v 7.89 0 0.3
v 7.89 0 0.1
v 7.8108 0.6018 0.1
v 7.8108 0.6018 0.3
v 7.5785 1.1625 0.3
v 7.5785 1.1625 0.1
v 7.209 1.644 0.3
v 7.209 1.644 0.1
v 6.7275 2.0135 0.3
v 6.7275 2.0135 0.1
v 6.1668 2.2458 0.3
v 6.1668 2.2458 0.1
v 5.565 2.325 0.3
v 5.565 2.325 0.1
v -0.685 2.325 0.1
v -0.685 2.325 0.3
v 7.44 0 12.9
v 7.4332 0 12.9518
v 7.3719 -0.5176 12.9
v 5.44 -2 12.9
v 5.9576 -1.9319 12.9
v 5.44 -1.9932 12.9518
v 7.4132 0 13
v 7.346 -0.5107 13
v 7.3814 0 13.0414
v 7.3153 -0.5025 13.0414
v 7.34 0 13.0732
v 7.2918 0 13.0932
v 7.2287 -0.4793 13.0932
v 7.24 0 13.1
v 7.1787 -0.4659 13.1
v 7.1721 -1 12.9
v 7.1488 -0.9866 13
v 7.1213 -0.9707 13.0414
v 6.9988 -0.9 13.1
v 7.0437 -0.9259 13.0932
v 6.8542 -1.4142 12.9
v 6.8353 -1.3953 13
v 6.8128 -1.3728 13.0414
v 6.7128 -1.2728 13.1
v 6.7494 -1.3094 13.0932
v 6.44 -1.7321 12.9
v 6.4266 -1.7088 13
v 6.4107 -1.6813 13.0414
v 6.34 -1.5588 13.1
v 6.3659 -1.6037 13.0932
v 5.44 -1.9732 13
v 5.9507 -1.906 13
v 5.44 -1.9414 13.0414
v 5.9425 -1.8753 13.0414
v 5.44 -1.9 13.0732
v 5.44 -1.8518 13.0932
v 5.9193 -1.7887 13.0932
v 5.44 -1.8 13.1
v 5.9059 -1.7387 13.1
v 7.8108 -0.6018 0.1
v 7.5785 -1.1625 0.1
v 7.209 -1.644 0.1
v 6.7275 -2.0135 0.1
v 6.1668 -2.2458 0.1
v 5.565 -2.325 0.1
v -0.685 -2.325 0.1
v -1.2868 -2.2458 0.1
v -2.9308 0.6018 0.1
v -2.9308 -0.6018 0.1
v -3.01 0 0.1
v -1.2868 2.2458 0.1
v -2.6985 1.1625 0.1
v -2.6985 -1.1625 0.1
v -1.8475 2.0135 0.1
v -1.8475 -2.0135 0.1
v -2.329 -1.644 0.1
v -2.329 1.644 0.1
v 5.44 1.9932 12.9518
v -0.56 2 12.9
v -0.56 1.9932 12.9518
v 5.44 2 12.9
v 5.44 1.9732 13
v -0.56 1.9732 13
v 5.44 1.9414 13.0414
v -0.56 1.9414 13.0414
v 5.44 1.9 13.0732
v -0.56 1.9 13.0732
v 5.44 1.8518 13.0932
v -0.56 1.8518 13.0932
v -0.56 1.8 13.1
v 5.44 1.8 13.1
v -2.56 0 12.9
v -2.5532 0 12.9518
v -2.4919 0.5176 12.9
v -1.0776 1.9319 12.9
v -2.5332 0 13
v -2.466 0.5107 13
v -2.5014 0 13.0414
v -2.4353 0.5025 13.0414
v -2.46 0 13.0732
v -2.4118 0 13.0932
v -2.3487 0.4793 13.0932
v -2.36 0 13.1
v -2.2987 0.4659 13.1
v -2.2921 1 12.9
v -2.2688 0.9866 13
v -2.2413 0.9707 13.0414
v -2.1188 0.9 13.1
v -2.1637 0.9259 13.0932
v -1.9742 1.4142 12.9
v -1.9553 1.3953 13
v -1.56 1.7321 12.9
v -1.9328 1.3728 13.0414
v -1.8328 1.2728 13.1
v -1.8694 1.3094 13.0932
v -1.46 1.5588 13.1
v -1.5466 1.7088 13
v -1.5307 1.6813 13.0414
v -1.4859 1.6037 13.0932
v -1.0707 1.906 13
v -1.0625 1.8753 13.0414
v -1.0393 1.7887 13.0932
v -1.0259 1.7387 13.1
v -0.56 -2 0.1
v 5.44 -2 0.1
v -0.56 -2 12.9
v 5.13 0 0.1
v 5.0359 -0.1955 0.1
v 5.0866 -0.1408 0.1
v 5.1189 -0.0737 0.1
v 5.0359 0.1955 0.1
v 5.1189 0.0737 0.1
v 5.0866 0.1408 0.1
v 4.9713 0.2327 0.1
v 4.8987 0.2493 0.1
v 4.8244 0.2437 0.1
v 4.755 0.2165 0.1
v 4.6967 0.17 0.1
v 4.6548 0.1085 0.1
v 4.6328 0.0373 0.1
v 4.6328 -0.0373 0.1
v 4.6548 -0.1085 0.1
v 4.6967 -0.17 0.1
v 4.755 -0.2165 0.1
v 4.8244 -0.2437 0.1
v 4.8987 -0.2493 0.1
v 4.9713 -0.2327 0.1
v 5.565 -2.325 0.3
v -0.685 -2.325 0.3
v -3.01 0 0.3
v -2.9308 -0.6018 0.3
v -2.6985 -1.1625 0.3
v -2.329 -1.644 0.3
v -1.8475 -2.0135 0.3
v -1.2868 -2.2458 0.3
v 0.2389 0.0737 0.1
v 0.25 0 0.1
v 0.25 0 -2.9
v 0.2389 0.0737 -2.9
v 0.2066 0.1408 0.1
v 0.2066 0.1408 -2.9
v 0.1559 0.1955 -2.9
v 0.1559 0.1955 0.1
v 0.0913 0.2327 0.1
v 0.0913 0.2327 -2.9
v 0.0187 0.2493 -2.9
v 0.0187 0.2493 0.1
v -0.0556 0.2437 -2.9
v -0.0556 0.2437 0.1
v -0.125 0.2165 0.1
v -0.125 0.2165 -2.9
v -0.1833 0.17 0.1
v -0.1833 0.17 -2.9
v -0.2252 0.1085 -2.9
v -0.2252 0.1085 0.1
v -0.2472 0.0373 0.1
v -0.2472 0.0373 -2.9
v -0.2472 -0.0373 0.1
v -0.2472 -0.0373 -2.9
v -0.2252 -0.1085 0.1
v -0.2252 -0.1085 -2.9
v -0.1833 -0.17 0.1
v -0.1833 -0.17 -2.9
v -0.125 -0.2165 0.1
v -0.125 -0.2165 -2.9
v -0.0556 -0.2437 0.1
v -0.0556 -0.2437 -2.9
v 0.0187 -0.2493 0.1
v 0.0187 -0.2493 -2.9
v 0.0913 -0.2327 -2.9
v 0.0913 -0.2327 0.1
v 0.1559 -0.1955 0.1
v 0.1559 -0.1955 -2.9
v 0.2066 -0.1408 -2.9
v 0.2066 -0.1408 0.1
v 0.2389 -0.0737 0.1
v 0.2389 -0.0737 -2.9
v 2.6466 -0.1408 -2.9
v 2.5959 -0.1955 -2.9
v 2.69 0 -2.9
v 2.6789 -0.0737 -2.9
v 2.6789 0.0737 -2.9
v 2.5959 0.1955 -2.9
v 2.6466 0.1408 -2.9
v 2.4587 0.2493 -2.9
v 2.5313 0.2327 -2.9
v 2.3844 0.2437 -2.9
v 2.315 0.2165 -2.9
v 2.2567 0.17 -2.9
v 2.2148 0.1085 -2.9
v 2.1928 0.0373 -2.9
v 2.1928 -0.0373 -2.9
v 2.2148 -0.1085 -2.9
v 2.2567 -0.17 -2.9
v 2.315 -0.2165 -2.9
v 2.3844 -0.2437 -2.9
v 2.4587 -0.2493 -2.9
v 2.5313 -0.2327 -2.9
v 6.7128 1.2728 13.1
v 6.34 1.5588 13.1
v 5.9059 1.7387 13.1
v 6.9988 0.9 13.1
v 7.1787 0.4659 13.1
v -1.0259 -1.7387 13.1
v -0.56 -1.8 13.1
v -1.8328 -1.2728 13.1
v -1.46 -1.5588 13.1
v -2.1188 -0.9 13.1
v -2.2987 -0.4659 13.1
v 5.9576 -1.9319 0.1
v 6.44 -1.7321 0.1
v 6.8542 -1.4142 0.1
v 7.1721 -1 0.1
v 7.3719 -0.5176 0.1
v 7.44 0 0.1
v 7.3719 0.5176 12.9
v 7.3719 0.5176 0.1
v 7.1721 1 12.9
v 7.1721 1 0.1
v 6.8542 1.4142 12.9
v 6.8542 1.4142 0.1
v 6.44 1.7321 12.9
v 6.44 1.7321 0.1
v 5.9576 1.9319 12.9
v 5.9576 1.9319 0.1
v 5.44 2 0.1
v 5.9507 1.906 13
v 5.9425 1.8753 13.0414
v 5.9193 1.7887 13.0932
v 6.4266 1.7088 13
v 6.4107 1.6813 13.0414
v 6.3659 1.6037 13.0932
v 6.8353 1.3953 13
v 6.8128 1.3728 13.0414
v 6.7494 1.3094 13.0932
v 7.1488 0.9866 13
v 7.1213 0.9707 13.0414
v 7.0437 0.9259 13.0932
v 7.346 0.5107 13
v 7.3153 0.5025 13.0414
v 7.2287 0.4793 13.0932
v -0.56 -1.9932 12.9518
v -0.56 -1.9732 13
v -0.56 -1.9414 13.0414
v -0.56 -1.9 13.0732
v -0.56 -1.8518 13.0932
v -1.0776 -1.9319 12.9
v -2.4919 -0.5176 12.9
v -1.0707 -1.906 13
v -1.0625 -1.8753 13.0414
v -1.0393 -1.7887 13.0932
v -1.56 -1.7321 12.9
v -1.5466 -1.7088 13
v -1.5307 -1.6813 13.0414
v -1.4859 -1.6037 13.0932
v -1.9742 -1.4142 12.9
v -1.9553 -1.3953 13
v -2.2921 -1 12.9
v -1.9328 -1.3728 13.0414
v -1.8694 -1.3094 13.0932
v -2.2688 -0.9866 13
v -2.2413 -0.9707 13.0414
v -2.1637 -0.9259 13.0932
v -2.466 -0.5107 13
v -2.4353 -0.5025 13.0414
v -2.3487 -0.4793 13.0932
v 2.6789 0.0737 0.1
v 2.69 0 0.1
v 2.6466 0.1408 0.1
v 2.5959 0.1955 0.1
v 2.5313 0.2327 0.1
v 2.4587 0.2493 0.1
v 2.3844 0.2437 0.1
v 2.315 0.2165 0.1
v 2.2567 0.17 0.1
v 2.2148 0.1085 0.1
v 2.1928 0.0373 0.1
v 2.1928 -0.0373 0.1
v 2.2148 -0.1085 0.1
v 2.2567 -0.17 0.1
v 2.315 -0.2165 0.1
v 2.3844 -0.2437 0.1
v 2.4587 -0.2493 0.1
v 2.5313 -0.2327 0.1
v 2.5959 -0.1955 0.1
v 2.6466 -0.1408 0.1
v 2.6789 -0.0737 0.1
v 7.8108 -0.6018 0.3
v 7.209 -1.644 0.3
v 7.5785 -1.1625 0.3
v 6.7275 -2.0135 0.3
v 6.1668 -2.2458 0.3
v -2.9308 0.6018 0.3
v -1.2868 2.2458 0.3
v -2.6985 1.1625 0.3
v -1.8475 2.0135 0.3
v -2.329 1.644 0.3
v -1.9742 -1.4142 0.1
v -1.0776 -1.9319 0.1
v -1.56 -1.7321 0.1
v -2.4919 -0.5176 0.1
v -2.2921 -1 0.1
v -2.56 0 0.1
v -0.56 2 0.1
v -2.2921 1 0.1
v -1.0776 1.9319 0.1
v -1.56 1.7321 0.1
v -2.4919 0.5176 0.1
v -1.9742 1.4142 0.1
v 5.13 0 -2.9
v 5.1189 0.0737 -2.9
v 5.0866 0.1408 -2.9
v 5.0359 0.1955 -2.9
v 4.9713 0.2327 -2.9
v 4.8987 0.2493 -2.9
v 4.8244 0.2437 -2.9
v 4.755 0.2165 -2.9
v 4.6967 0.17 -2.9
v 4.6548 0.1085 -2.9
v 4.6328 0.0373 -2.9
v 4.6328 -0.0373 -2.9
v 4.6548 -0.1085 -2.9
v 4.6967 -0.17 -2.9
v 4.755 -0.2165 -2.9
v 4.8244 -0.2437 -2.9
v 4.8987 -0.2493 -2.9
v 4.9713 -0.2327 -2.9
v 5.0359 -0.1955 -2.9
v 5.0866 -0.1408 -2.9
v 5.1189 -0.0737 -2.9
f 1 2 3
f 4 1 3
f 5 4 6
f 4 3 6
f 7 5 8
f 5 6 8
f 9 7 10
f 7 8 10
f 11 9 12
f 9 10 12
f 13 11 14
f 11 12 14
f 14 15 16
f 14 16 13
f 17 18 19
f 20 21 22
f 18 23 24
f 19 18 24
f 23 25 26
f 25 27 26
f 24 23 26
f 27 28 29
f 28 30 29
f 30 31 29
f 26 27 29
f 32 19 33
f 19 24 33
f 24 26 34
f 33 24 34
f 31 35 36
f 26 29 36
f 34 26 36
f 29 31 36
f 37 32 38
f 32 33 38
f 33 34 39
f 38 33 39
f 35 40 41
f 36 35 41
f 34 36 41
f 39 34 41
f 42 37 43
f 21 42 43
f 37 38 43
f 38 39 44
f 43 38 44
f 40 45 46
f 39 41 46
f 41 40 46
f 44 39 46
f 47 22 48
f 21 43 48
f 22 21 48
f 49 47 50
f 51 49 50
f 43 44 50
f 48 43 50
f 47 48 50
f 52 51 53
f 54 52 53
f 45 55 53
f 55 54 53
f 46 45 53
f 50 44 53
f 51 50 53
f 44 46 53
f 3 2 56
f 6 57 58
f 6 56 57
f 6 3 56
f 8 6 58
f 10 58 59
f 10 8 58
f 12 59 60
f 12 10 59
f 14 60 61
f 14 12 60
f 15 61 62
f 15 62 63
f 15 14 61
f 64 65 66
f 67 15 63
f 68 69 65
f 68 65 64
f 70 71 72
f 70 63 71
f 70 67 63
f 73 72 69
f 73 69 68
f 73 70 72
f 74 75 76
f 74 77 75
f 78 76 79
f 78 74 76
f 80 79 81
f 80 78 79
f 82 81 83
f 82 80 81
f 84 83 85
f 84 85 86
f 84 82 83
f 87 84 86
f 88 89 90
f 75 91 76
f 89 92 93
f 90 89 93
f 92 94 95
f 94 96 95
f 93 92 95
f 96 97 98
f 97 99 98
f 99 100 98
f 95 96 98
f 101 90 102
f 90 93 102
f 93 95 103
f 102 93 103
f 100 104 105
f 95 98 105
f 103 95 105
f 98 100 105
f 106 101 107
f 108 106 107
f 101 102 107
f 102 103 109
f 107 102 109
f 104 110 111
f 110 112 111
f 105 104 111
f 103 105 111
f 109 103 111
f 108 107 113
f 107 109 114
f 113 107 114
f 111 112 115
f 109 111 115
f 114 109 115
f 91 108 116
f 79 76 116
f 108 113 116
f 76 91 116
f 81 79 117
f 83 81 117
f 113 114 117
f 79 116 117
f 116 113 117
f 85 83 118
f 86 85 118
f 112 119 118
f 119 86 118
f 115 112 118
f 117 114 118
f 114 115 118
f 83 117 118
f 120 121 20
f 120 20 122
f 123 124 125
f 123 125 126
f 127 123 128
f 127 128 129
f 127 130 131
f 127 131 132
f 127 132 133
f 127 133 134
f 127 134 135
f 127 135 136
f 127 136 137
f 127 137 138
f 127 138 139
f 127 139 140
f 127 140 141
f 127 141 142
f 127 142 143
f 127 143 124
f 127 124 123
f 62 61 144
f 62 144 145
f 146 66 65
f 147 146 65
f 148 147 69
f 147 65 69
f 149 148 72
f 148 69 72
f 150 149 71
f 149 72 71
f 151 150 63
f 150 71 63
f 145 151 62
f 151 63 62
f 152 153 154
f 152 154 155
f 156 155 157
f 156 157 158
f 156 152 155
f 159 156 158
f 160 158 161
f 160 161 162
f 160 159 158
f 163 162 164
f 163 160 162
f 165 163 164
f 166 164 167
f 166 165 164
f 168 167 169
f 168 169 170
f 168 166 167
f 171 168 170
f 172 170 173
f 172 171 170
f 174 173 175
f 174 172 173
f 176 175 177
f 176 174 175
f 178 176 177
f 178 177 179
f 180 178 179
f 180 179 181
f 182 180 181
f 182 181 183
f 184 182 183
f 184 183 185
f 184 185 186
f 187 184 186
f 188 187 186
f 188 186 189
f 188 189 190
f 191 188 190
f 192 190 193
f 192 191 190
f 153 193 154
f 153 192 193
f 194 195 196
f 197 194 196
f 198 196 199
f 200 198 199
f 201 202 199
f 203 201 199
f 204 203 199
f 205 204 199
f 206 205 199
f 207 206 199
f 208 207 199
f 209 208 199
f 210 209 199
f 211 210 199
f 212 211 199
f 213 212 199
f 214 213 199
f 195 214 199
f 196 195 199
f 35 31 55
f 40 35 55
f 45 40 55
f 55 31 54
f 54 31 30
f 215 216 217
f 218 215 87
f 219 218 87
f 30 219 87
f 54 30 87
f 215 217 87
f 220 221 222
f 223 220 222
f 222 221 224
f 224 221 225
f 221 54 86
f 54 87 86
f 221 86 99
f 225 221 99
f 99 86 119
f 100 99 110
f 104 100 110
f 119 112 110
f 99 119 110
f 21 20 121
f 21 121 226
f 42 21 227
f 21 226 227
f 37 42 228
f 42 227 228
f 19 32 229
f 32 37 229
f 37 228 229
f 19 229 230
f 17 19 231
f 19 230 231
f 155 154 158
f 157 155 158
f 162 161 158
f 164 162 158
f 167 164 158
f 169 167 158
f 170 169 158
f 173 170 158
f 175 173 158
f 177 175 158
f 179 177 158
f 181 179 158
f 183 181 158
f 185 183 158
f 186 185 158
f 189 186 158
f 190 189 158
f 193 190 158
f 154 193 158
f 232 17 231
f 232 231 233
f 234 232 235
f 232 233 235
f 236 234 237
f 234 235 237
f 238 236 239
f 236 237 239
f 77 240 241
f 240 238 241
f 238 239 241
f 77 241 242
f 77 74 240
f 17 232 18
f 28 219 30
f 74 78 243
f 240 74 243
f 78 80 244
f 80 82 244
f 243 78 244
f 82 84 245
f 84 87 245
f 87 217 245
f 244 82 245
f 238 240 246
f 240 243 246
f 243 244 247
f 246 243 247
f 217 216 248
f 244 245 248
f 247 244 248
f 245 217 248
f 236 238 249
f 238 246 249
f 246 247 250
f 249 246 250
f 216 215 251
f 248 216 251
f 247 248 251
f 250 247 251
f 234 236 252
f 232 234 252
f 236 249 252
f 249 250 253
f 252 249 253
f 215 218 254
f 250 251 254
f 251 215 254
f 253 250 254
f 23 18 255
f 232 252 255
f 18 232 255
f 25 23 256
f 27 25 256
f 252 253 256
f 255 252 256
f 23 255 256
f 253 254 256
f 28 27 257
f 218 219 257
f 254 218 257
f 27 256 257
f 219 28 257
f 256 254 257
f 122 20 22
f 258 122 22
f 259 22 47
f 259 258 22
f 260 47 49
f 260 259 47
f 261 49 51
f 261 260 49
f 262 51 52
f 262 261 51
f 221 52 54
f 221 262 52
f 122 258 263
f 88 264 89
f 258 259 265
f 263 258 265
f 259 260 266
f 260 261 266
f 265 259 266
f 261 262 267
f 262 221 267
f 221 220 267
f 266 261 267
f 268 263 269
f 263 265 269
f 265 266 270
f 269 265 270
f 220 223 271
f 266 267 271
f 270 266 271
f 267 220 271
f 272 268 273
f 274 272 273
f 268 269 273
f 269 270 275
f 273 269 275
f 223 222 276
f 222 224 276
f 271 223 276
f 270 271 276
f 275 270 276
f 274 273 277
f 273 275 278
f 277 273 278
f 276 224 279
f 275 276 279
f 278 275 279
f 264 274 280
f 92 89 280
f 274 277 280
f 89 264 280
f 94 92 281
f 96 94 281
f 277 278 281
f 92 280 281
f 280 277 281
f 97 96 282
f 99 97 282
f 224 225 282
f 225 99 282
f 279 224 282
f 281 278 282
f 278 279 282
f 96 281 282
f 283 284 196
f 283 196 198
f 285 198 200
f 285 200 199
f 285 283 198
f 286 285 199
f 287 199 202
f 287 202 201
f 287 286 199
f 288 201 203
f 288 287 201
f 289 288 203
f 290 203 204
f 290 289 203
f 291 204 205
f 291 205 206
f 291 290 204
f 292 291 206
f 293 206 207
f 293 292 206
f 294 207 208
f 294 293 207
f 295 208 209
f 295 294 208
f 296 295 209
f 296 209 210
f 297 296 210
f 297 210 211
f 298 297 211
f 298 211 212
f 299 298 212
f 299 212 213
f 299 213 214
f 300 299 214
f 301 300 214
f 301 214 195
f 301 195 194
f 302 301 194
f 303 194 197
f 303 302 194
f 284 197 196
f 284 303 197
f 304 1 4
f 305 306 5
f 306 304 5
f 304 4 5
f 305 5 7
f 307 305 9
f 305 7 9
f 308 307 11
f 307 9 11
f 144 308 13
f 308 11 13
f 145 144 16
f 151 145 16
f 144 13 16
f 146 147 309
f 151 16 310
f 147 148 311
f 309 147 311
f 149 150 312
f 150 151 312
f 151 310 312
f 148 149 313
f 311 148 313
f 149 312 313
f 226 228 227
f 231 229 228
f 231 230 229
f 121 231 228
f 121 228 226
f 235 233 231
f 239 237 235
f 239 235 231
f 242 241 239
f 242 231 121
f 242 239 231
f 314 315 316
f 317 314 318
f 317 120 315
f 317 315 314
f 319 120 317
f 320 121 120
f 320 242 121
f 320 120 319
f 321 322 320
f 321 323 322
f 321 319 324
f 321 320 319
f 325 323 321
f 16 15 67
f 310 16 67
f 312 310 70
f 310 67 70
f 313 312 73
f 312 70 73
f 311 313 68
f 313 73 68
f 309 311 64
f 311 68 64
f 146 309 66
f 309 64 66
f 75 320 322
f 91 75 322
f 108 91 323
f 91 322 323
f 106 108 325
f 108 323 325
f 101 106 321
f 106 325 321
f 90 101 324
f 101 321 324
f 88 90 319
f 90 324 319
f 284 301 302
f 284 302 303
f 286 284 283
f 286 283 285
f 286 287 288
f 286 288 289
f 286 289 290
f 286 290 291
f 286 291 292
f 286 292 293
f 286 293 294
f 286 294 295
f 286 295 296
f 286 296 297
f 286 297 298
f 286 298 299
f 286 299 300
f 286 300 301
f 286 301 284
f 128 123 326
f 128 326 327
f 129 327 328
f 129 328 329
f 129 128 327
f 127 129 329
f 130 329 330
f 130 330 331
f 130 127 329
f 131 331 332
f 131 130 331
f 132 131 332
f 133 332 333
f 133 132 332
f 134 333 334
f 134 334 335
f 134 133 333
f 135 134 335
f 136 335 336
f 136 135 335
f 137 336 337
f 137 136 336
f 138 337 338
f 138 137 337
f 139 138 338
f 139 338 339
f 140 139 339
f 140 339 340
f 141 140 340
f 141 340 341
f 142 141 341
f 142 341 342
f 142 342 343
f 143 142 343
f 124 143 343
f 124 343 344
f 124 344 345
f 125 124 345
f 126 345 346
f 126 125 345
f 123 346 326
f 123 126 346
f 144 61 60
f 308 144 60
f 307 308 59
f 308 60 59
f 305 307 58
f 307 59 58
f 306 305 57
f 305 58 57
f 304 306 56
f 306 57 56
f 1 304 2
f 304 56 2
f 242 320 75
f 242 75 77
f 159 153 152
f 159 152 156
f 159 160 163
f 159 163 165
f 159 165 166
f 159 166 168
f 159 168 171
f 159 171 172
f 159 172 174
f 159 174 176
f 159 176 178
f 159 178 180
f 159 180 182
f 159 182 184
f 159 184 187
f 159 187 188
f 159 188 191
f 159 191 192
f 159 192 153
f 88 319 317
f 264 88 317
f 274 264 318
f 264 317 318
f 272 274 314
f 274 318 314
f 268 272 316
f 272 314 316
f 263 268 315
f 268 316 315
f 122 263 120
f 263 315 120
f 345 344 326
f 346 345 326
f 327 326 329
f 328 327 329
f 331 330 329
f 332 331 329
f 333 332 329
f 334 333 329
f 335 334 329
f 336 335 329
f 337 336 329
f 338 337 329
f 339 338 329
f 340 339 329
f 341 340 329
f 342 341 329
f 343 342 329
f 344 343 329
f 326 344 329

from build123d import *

# Parameters (mm, degrees)
SKETCH_R     = 0.25
PAD_DEPTH    = 3
PAD001_DEPTH = 0.2
PAD002_DEPTH = 13
FILLET_R     = 0.2


with BuildPart() as pad:
    # Sketch → Pad (new body)
    with BuildSketch(Plane.XY.offset(0.1)):
        Circle(SKETCH_R)
        with Locations((4.88, 0)):
            Circle(SKETCH_R)
        with Locations((2.44, 0)):
            Circle(SKETCH_R)
    extrude(amount=-PAD_DEPTH)


with BuildPart() as pad001:
    # Sketch001 → Pad001 (new body)
    with BuildSketch(Plane.XY.offset(0.1)):
        with BuildLine():
            Line((-0.685, 2.325), (5.565, 2.325))
            ThreePointArc((7.89, 0), (7.209023, 1.644023), (5.565, 2.325))
            ThreePointArc((5.565, -2.325), (7.209023, -1.644023), (7.89, 0))
            Line((5.565, -2.325), (-0.685, -2.325))
            ThreePointArc((-3.01, 0), (-2.329023, -1.644023), (-0.685, -2.325))
            ThreePointArc((-0.685, 2.325), (-2.329023, 1.644023), (-3.01, 0))
        make_face()
    extrude(amount=PAD001_DEPTH)


with BuildPart() as fillet_body:
    # Sketch003 → Pad002 (new body)
    with BuildSketch(Plane.XY.offset(0.1)):
        with BuildLine():
            Line((-0.56, 2), (5.44, 2))
            ThreePointArc((7.44, 0), (6.854214, 1.414214), (5.44, 2))
            ThreePointArc((5.44, -2), (6.854214, -1.414214), (7.44, 0))
            Line((5.44, -2), (-0.56, -2))
            ThreePointArc((-2.56, 0), (-1.974214, -1.414214), (-0.56, -2))
            ThreePointArc((-0.56, 2), (-1.974214, 1.414214), (-2.56, 0))
        make_face()
    extrude(amount=PAD002_DEPTH)

    # Fillet
    fillet_edges = [fillet_body.edges().sort_by_distance(p)[0] for p in [
        (2.44, 2, 13.1),
        (-1.974214, 1.414214, 13.1),
        (-1.974214, -1.414214, 13.1),
        (2.44, -2, 13.1),
        (6.854214, -1.414214, 13.1),
        (6.854214, 1.414214, 13.1),
    ]]
    fillet(fillet_edges, radius=FILLET_R)


solid = Compound([pad.part, pad001.part, fillet_body.part])
